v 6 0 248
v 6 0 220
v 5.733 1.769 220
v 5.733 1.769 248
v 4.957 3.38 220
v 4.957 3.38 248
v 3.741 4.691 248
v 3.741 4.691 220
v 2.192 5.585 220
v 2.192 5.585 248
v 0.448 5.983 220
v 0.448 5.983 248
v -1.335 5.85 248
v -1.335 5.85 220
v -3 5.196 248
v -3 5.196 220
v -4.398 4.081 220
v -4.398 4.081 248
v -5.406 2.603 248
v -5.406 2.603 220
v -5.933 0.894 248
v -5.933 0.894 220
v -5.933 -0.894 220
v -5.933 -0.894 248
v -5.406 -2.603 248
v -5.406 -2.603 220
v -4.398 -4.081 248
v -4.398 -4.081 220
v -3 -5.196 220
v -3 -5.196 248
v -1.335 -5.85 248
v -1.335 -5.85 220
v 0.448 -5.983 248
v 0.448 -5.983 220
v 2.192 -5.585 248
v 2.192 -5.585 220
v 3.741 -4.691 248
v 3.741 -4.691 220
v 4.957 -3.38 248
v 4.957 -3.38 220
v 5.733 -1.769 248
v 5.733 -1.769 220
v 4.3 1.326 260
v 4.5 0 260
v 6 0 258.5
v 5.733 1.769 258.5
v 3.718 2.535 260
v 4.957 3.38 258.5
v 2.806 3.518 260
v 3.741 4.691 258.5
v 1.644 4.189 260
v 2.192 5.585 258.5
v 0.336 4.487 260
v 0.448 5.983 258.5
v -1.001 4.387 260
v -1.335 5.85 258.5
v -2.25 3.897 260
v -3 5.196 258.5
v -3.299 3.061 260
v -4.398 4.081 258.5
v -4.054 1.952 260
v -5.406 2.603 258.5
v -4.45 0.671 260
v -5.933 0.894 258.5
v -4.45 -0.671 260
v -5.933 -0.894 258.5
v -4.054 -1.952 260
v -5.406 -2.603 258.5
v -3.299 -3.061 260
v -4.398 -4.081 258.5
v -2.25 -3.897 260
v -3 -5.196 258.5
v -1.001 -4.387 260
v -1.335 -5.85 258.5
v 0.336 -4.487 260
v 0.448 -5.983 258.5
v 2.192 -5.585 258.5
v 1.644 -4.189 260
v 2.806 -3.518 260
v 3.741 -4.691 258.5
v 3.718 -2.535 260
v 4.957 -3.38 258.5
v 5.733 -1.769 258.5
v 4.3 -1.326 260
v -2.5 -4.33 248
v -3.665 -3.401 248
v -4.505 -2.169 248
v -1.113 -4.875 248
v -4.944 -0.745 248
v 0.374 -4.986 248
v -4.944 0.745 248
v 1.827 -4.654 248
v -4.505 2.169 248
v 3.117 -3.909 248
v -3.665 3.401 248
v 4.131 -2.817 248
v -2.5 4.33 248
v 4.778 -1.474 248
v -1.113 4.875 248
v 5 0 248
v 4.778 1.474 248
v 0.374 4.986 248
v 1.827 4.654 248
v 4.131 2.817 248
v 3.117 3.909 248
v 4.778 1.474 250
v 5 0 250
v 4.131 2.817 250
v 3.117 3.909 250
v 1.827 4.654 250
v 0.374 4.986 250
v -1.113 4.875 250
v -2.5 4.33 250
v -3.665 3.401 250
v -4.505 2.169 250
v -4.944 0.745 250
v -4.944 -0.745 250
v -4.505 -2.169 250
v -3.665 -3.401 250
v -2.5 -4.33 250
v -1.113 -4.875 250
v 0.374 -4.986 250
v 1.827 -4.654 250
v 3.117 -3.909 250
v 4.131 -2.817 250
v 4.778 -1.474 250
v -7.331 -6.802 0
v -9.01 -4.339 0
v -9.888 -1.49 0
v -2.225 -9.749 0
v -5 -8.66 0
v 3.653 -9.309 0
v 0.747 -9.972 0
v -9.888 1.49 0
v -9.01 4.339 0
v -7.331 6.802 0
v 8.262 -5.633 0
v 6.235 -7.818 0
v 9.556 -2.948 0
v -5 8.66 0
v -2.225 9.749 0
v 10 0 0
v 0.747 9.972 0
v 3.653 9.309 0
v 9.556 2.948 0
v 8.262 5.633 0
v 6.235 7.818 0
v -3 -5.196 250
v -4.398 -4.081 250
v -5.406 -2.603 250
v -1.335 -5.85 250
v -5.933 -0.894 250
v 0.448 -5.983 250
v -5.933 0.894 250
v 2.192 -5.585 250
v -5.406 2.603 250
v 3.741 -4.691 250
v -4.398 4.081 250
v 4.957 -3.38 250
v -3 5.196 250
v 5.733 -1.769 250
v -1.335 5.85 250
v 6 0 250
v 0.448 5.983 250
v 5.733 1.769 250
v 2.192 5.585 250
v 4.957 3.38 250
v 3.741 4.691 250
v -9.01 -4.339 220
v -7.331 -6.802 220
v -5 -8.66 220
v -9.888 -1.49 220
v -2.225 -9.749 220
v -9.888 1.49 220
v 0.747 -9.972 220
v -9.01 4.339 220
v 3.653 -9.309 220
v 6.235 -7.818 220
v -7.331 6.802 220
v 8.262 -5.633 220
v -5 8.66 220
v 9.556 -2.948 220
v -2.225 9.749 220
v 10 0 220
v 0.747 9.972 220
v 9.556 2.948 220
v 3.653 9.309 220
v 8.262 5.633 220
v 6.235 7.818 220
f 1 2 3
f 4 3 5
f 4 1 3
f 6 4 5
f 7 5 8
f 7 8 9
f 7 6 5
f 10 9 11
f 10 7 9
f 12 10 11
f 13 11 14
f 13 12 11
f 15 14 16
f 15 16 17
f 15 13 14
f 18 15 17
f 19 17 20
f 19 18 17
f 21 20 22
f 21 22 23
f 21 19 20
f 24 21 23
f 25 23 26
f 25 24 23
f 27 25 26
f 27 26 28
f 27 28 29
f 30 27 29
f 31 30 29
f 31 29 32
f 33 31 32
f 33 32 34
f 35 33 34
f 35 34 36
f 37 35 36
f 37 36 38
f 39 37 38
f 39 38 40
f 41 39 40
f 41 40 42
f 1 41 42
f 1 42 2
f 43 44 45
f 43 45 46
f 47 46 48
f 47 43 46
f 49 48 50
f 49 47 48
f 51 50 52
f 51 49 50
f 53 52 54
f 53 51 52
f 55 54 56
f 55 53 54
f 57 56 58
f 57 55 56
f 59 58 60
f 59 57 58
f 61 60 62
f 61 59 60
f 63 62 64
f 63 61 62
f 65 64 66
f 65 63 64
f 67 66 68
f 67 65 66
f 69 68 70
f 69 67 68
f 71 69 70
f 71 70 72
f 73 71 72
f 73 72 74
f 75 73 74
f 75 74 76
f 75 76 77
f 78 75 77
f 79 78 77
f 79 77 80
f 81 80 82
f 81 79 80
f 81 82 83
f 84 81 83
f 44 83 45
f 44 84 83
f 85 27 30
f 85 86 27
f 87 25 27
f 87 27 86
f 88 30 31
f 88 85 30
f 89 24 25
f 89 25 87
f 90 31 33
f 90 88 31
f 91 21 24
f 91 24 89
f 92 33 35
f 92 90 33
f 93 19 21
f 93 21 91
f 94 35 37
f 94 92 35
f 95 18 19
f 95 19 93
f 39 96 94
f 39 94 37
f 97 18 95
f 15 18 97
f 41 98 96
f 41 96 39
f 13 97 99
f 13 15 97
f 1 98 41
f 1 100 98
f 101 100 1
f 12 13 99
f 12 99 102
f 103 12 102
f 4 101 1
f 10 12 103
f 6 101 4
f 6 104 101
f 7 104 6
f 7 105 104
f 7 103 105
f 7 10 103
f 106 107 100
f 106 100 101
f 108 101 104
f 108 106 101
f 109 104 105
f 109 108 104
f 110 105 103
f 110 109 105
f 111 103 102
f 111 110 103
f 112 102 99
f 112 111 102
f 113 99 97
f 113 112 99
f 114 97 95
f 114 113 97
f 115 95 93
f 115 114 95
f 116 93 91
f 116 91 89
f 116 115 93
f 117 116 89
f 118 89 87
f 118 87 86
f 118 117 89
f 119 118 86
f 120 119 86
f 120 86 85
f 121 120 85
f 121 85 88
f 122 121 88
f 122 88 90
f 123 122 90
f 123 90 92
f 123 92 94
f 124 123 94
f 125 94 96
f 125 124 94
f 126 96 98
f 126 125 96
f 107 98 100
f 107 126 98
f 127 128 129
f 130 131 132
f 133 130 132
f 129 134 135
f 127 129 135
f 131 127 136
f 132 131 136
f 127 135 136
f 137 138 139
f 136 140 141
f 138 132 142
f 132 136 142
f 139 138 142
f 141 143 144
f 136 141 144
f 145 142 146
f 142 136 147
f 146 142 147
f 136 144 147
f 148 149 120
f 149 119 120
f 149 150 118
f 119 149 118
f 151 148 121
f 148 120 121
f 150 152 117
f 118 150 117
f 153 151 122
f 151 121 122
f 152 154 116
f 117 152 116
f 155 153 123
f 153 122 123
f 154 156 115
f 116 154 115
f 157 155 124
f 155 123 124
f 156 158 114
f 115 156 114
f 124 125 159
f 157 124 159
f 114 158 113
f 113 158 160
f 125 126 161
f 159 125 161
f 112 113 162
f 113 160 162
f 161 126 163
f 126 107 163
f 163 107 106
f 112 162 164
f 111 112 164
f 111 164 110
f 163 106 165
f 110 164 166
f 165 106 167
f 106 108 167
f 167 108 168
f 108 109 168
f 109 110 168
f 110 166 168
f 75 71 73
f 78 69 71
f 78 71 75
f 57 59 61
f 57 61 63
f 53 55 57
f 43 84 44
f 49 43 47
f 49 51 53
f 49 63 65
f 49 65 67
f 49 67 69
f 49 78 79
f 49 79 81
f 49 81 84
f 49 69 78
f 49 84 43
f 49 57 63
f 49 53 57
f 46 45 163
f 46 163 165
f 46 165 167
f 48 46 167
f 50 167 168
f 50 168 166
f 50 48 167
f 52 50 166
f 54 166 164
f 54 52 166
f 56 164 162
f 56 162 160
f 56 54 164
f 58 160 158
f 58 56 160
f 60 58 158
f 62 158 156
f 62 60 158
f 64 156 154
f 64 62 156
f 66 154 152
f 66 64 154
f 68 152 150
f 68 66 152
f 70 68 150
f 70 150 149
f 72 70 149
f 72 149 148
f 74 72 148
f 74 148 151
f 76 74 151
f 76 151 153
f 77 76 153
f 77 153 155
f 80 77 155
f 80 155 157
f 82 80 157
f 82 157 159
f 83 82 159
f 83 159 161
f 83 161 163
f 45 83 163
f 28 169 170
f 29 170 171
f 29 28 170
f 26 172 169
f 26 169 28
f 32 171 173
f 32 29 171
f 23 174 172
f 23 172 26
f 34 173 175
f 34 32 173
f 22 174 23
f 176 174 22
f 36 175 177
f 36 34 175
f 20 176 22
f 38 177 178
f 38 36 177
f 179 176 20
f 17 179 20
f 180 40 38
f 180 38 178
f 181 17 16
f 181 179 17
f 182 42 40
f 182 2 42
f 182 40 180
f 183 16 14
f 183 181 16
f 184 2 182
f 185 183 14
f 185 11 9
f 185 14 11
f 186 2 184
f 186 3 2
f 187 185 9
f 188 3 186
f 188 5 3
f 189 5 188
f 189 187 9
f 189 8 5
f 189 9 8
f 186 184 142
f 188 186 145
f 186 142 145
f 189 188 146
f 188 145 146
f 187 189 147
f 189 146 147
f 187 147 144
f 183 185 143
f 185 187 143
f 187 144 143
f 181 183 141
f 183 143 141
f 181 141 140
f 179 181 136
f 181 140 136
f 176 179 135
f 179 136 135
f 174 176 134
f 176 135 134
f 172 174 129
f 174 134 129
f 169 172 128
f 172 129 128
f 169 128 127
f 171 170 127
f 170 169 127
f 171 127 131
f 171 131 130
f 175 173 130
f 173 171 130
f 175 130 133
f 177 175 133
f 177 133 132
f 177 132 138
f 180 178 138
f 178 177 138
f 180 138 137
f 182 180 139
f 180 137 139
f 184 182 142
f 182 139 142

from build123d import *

# Parameters (mm, degrees)
SKETCH_1_R          = 10
EXTRUDE_1_DEPTH     = 260
SKETCH_2_OUTSIDE_W  = 74.306
SKETCH_2_OUTSIDE_H  = 74.306
SKETCH_2_OUTSIDE_R  = 6
CUT_EXTRUDE_1_DEPTH = 40
SKETCH_3_OUTSIDE_W  = 74.306
SKETCH_3_OUTSIDE_H  = 74.306
SKETCH_3_OUTSIDE_R  = 5
CUT_EXTRUDE_2_DEPTH = 2
CHAMFER_1_SIZE      = 1.5


with BuildPart() as part:
    # 草图1 → 凸台-拉伸1 (new body)
    with BuildSketch(Plane.XY):
        Circle(SKETCH_1_R)
    extrude(amount=EXTRUDE_1_DEPTH)

    # 草图2 outside → 切除-拉伸1 (cut)
    with BuildSketch(Plane.XY.offset(260)):
        Rectangle(SKETCH_2_OUTSIDE_W, SKETCH_2_OUTSIDE_H)
        Circle(SKETCH_2_OUTSIDE_R, mode=Mode.SUBTRACT)
    extrude(amount=-CUT_EXTRUDE_1_DEPTH, mode=Mode.SUBTRACT)

    # 草图3 outside → 切除-拉伸2 (cut)
    with BuildSketch(Plane.XY.offset(250)):
        Rectangle(SKETCH_3_OUTSIDE_W, SKETCH_3_OUTSIDE_H)
        Circle(SKETCH_3_OUTSIDE_R, mode=Mode.SUBTRACT)
    extrude(amount=-CUT_EXTRUDE_2_DEPTH, mode=Mode.SUBTRACT)

    # 倒角1
    chamfer_1_edges = [part.edges().sort_by_distance(p)[0] for p in [
        (-6, 0, 260),
    ]]
    chamfer(chamfer_1_edges, length=CHAMFER_1_SIZE)


solid = part.part
